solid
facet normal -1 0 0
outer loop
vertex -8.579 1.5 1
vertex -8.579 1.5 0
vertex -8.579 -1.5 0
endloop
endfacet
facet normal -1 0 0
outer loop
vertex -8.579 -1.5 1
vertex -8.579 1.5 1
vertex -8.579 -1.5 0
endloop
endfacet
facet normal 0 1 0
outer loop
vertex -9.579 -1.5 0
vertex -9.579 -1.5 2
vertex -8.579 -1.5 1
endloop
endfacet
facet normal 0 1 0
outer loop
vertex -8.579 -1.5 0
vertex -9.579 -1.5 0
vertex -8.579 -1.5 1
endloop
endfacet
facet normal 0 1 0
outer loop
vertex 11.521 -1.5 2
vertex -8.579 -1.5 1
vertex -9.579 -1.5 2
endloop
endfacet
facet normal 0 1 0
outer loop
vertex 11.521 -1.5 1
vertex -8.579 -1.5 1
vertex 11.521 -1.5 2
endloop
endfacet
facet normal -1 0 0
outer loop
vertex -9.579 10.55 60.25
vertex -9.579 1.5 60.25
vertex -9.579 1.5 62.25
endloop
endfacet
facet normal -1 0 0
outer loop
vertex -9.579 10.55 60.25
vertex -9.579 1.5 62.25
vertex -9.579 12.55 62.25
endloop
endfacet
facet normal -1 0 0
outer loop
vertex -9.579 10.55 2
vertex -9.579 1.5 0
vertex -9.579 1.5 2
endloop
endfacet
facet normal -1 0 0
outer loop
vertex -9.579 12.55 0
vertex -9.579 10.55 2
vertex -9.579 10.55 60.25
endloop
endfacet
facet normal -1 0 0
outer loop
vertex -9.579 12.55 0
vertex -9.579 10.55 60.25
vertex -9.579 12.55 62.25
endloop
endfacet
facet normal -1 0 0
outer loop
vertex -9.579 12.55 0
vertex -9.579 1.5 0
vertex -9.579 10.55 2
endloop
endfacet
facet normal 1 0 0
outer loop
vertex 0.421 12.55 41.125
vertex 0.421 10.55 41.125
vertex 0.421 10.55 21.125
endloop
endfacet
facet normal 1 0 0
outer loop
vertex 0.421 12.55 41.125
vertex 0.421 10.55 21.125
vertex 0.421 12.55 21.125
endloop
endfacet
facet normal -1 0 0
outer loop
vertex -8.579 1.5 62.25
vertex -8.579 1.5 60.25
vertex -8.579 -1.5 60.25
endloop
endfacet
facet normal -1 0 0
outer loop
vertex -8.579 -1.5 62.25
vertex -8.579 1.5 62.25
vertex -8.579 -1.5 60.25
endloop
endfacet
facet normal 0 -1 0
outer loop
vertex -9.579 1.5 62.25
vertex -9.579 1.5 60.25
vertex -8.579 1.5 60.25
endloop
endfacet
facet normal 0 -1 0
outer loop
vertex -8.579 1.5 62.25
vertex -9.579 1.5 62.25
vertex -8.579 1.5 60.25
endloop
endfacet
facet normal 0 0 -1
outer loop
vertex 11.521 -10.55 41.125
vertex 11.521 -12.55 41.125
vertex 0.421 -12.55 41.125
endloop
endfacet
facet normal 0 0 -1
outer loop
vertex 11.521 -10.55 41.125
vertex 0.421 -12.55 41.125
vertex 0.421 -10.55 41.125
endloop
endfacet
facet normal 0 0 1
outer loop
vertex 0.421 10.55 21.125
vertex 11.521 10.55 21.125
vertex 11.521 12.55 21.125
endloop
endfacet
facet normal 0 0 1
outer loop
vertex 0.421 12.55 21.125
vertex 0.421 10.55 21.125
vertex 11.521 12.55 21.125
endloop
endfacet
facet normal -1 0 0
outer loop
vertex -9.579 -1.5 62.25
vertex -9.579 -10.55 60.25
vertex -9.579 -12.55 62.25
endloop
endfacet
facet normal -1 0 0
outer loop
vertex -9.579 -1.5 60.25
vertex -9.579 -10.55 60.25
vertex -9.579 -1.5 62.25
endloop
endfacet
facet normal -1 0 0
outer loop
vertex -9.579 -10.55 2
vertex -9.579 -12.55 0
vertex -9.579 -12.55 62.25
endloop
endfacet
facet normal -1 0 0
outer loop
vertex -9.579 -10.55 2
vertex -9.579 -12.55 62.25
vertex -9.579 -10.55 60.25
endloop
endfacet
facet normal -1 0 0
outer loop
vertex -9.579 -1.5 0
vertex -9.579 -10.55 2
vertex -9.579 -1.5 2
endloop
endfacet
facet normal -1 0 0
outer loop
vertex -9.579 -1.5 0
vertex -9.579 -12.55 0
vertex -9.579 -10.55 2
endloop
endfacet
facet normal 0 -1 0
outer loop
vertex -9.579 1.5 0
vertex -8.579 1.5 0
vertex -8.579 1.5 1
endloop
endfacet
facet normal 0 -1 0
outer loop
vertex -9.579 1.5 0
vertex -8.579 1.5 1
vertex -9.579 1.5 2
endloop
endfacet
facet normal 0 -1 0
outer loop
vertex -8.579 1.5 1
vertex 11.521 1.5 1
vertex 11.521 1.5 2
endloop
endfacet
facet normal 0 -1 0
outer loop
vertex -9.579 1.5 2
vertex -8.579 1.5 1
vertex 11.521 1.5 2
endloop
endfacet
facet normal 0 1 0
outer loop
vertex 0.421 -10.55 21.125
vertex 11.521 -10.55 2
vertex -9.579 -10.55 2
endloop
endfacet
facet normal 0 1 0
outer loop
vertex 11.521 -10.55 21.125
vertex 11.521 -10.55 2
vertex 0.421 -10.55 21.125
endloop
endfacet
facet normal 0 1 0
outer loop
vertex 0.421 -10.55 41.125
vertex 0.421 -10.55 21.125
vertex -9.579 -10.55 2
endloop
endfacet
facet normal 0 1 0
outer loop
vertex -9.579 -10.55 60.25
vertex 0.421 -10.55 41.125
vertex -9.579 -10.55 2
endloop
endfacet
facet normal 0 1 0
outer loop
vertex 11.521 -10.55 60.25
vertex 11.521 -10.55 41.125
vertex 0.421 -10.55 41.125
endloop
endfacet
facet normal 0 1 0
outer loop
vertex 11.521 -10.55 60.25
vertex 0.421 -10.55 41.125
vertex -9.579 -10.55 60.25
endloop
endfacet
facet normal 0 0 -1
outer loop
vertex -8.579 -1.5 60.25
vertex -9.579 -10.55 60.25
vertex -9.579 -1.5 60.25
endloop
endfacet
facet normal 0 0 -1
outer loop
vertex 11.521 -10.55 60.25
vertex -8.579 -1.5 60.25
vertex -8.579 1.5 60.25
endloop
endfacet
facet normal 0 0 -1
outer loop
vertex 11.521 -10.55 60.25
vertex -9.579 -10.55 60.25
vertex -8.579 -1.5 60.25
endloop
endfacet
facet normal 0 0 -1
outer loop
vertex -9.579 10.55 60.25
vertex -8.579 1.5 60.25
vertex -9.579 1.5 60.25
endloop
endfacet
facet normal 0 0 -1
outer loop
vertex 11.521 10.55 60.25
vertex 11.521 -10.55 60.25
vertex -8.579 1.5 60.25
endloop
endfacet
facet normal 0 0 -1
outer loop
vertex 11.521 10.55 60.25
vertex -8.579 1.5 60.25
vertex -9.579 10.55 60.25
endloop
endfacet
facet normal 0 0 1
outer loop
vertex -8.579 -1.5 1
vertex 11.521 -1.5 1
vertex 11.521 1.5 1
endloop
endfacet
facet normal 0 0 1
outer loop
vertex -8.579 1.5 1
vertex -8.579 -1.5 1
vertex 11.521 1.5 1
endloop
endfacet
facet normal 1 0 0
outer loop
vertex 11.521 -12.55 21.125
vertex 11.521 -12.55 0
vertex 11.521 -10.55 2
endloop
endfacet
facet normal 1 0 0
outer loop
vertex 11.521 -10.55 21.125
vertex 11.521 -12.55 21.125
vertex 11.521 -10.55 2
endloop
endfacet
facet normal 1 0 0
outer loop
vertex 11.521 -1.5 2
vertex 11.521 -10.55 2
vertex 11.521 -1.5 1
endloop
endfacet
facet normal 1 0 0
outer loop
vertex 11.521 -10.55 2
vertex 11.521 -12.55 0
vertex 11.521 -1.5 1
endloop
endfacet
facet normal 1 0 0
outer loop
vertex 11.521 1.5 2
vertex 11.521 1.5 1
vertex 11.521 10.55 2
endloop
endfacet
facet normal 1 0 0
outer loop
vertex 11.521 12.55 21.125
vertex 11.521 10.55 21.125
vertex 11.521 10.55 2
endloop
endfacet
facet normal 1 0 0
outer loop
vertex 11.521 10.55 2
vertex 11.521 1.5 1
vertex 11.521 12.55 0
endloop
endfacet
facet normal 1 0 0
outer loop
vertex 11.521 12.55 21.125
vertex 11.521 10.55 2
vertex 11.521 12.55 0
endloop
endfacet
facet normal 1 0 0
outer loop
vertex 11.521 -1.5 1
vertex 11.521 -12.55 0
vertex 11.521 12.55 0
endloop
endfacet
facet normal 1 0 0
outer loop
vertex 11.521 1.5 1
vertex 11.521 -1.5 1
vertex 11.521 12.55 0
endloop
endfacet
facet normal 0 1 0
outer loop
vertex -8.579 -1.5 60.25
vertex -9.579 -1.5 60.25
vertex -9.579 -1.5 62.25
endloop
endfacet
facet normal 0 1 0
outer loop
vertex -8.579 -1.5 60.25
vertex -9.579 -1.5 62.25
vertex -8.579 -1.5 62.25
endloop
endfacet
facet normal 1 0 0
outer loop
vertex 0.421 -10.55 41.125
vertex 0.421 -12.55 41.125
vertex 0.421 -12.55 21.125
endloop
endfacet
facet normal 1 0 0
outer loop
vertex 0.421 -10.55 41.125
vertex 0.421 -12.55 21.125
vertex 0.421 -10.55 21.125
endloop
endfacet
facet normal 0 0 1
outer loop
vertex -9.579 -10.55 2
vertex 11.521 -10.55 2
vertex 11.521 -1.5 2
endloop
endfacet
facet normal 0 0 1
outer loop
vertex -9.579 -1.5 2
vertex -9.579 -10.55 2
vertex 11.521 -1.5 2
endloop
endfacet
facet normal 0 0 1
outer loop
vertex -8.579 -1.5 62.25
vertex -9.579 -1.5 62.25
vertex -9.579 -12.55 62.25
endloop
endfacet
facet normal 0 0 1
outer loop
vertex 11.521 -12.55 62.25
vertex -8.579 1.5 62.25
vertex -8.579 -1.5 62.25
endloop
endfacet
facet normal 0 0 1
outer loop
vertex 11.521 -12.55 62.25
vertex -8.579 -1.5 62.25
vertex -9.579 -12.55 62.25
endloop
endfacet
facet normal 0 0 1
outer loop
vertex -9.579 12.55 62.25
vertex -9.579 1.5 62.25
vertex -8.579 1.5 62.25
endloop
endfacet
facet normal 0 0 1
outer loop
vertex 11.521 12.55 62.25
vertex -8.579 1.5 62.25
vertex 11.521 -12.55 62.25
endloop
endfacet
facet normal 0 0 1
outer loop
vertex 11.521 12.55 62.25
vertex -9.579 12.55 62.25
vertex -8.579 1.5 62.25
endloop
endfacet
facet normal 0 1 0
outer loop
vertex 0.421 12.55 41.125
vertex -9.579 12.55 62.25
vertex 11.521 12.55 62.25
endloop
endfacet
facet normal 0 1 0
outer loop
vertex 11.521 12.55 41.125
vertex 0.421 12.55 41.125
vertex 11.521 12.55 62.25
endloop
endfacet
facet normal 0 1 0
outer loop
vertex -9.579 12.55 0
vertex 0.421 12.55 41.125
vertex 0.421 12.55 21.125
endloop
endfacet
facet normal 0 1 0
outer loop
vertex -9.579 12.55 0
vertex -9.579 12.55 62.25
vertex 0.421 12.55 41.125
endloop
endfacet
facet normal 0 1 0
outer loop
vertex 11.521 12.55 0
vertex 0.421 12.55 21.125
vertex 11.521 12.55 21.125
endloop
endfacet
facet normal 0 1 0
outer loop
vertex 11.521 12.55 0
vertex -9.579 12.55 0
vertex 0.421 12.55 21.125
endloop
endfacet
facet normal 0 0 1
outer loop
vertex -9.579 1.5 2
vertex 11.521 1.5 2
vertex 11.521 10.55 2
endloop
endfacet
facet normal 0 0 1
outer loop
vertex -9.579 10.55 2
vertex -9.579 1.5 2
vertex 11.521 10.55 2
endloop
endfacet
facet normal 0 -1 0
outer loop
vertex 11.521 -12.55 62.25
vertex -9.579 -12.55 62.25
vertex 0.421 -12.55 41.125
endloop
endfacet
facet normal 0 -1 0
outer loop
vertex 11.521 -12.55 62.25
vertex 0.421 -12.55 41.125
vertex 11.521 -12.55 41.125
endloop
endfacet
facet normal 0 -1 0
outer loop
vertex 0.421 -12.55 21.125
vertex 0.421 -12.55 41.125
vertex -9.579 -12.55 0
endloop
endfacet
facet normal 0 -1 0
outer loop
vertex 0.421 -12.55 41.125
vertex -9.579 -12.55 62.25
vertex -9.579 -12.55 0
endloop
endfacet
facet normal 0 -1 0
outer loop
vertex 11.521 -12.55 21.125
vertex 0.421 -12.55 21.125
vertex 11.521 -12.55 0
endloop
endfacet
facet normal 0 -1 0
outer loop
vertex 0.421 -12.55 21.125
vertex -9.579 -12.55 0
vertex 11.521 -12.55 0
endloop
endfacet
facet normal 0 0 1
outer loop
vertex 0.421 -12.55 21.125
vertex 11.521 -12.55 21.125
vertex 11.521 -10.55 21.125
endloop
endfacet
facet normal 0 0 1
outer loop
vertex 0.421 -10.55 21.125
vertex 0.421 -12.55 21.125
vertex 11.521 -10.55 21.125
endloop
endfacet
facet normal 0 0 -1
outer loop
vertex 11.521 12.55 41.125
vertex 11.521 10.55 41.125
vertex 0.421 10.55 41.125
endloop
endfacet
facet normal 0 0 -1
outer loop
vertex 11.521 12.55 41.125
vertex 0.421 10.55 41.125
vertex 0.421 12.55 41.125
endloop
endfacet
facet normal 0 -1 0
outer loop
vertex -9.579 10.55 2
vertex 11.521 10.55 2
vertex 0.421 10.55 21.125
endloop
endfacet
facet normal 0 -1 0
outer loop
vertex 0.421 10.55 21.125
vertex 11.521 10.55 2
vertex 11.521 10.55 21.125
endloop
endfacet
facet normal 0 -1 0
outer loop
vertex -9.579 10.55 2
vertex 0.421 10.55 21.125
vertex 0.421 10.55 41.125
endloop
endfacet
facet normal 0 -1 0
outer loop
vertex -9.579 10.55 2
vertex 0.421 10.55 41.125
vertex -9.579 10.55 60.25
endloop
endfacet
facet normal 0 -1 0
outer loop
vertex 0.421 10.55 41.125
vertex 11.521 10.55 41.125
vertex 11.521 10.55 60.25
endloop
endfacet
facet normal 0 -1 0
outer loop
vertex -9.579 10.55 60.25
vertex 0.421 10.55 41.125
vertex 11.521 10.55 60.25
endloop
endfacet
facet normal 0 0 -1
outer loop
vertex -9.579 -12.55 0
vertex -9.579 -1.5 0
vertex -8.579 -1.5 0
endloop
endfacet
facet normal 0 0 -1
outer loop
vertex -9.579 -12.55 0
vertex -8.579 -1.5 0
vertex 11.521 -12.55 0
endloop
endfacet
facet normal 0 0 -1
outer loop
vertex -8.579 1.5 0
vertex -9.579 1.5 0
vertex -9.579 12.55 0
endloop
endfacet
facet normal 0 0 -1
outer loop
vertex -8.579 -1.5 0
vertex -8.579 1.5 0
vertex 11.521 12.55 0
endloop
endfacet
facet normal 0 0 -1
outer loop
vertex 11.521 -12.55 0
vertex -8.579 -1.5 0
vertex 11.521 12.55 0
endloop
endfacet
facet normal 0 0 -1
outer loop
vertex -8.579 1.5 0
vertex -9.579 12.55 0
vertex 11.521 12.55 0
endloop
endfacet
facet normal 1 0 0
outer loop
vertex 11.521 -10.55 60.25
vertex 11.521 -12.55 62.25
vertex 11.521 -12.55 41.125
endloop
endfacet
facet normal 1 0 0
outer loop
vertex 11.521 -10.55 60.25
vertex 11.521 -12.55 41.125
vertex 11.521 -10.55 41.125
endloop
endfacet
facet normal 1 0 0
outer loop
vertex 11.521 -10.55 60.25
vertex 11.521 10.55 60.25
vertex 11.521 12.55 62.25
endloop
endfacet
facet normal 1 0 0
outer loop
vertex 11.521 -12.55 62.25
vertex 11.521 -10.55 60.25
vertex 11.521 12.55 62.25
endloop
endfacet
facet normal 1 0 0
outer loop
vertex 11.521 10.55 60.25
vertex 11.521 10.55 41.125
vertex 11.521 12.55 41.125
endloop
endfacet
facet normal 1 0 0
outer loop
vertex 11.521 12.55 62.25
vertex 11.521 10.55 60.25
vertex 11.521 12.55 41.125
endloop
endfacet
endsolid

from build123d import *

# Parameters (mm, degrees)
F0_W           = 21.1
F0_H           = 25.1
F1_DEPTH       = 62.25
F2_W           = 21.1
F2_H           = 58.25
F3_DEPTH       = 25.4
F3_DEPTH_BACK  = 25.4
F4_W           = 3
F4_H           = 2
F5_DEPTH       = 25.4
F5_DEPTH_BACK  = 25.4
F6_W           = 25.1
F6_H           = 20
F7_DEPTH       = 11.1
F8_W           = 1
F8_H           = 3
F9_DEPTH       = 25.4
F9_DEPTH_BACK  = 25.4
F10_W          = 1
F10_H          = 3
F11_DEPTH      = 25.4
F11_DEPTH_BACK = 25.4


with BuildPart() as f1:
    # F0 (on Top) → F1 (new body)
    with BuildSketch(Plane.XY):
        with Locations((0.971473, 0)):
            Rectangle(F0_W, F0_H)
    extrude(amount=F1_DEPTH)

    # F2 (on face) → F3 (cut, two sides)
    with BuildSketch(Plane.YZ.offset(11.521473)) as f3_sk:
        with Locations((0, 31.125)):
            Rectangle(F2_W, F2_H)
    extrude(amount=-F3_DEPTH, mode=Mode.SUBTRACT)
    extrude(f3_sk.sketch, amount=-F3_DEPTH_BACK, mode=Mode.SUBTRACT)

    # F4 (on face) → F5 (cut, two sides)
    with BuildSketch(Plane.YZ.offset(11.521473)) as f5_sk:
        with Locations((0, 2)):
            Rectangle(F4_W, F4_H)
    extrude(amount=-F5_DEPTH, mode=Mode.SUBTRACT)
    extrude(f5_sk.sketch, amount=-F5_DEPTH_BACK, mode=Mode.SUBTRACT)

    # F6 (on face) → F7 (cut)
    with BuildSketch(Plane.YZ.offset(11.521473)):
        with Locations((0, 31.125)):
            Rectangle(F6_W, F6_H)
    extrude(amount=-F7_DEPTH, mode=Mode.SUBTRACT)

    # F8 (on face) → F9 (cut, two sides)
    with BuildSketch(Plane(origin=(0, 0, 0), x_dir=(1, 0, 0), z_dir=(0, 0, -1))) as f9_sk:
        with Locations((-9.078527, 0)):
            Rectangle(F8_W, F8_H)
    extrude(amount=-F9_DEPTH, mode=Mode.SUBTRACT)
    extrude(f9_sk.sketch, amount=-F9_DEPTH_BACK, mode=Mode.SUBTRACT)

    # F10 (on face) → F11 (cut, two sides)
    with BuildSketch(Plane(origin=(0, 0, 60.25), x_dir=(1, 0, 0), z_dir=(0, 0, -1))) as f11_sk:
        with Locations((-9.078527, 0)):
            Rectangle(F10_W, F10_H)
    extrude(amount=-F11_DEPTH, mode=Mode.SUBTRACT)
    extrude(f11_sk.sketch, amount=-F11_DEPTH_BACK, mode=Mode.SUBTRACT)


with BuildPart() as f12_1:
    # F12: copy of F1
    add(f1.part)


solid = f1.part
